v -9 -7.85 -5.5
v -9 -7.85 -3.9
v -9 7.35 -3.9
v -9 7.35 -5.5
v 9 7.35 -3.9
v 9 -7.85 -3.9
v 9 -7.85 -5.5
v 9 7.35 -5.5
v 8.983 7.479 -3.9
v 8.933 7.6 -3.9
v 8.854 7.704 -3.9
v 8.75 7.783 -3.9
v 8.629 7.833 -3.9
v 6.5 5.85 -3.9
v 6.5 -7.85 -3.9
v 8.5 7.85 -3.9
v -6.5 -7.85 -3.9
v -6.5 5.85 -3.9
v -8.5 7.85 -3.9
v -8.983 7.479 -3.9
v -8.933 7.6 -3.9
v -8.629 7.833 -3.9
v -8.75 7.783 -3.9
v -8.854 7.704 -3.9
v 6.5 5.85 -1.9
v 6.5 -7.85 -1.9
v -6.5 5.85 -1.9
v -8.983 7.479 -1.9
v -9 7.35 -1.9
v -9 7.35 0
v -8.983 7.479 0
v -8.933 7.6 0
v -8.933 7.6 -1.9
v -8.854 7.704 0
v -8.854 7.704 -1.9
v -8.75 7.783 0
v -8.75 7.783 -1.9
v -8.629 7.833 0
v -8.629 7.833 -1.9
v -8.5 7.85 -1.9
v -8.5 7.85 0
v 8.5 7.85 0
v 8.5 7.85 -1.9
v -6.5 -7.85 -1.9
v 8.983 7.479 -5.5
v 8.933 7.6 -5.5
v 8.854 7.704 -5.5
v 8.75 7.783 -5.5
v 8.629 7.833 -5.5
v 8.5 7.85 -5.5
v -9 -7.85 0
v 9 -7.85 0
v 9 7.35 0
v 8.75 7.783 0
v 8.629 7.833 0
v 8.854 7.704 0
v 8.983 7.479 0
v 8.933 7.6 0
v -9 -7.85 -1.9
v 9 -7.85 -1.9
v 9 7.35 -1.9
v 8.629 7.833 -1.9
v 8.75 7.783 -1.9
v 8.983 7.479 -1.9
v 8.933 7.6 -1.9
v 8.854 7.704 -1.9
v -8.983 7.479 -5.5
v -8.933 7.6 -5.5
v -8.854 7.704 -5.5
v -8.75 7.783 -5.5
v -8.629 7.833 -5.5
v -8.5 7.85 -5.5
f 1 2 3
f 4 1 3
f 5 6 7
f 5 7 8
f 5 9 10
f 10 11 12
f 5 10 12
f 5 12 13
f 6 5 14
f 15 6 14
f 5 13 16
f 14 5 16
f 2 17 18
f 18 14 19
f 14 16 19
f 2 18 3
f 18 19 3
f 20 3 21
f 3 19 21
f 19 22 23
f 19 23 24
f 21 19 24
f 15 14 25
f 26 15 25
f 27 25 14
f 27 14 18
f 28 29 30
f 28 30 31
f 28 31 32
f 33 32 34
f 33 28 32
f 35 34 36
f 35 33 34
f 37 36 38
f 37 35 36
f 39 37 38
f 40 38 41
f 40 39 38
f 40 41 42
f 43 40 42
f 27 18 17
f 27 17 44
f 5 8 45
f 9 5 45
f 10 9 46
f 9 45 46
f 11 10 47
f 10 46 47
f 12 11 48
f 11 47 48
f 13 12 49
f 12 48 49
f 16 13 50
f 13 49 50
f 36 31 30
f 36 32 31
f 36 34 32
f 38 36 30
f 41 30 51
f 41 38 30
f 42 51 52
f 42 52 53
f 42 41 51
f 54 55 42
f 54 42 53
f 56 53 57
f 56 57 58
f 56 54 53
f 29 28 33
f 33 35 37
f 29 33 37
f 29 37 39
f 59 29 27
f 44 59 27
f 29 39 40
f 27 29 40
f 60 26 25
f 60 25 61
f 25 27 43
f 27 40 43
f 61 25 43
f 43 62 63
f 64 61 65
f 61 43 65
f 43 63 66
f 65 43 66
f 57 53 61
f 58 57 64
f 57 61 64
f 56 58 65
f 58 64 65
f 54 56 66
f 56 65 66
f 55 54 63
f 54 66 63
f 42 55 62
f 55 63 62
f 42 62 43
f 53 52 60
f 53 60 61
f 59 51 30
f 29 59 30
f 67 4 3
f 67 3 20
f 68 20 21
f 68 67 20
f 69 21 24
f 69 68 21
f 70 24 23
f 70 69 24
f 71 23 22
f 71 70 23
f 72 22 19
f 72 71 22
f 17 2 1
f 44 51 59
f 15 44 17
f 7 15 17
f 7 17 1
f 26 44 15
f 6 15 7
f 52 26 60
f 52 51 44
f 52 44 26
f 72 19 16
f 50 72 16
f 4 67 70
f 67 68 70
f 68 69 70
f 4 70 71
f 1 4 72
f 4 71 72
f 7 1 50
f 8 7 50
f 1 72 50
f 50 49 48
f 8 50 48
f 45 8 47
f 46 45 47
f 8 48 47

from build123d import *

# Parameters (mm, degrees)
F0_W     = 18
F0_H     = 15.7
F1_DEPTH = 5.5
F2_R     = 0.5
F3_W     = 2
F3_H     = 2
F3_W_2   = 0.5
F4_DEPTH = 25
F3_W_3   = 13
F5_DEPTH = 2


with BuildPart() as f1:
    # F0 (on Top) → F1 (new body)
    with BuildSketch(Plane.XY):
        Rectangle(F0_W, F0_H)
    extrude(amount=-F1_DEPTH)

    # F2
    f2_edges = [f1.edges().sort_by_distance(p)[0] for p in [
        (9, 7.85, -2.75),
        (-9, 7.85, -2.75),
    ]]
    fillet(f2_edges, radius=F2_R)

    # F3 (on face) → F4 (cut)
    with BuildSketch(Plane(origin=(0, 7.85, 0), x_dir=(-1, 0, 0), z_dir=(0, 1, 0))):
        with Locations((-7.5, -2.9)):
            Rectangle(F3_W, F3_H)
        with Locations((-8.75, -2.9)):
            Rectangle(F3_W_2, F3_H)
        with Locations((7.5, -2.9)):
            Rectangle(F3_W, F3_H)
        with Locations((8.75, -2.9)):
            Rectangle(F3_W_2, F3_H)
    extrude(amount=-F4_DEPTH, mode=Mode.SUBTRACT)

    # F3 (on face) → F5 (cut)
    with BuildSketch(Plane(origin=(0, 7.85, 0), x_dir=(-1, 0, 0), z_dir=(0, 1, 0))):
        with Locations((0, -2.9)):
            Rectangle(F3_W_3, F3_H)
    extrude(amount=-F5_DEPTH, mode=Mode.SUBTRACT)


solid = f1.part
